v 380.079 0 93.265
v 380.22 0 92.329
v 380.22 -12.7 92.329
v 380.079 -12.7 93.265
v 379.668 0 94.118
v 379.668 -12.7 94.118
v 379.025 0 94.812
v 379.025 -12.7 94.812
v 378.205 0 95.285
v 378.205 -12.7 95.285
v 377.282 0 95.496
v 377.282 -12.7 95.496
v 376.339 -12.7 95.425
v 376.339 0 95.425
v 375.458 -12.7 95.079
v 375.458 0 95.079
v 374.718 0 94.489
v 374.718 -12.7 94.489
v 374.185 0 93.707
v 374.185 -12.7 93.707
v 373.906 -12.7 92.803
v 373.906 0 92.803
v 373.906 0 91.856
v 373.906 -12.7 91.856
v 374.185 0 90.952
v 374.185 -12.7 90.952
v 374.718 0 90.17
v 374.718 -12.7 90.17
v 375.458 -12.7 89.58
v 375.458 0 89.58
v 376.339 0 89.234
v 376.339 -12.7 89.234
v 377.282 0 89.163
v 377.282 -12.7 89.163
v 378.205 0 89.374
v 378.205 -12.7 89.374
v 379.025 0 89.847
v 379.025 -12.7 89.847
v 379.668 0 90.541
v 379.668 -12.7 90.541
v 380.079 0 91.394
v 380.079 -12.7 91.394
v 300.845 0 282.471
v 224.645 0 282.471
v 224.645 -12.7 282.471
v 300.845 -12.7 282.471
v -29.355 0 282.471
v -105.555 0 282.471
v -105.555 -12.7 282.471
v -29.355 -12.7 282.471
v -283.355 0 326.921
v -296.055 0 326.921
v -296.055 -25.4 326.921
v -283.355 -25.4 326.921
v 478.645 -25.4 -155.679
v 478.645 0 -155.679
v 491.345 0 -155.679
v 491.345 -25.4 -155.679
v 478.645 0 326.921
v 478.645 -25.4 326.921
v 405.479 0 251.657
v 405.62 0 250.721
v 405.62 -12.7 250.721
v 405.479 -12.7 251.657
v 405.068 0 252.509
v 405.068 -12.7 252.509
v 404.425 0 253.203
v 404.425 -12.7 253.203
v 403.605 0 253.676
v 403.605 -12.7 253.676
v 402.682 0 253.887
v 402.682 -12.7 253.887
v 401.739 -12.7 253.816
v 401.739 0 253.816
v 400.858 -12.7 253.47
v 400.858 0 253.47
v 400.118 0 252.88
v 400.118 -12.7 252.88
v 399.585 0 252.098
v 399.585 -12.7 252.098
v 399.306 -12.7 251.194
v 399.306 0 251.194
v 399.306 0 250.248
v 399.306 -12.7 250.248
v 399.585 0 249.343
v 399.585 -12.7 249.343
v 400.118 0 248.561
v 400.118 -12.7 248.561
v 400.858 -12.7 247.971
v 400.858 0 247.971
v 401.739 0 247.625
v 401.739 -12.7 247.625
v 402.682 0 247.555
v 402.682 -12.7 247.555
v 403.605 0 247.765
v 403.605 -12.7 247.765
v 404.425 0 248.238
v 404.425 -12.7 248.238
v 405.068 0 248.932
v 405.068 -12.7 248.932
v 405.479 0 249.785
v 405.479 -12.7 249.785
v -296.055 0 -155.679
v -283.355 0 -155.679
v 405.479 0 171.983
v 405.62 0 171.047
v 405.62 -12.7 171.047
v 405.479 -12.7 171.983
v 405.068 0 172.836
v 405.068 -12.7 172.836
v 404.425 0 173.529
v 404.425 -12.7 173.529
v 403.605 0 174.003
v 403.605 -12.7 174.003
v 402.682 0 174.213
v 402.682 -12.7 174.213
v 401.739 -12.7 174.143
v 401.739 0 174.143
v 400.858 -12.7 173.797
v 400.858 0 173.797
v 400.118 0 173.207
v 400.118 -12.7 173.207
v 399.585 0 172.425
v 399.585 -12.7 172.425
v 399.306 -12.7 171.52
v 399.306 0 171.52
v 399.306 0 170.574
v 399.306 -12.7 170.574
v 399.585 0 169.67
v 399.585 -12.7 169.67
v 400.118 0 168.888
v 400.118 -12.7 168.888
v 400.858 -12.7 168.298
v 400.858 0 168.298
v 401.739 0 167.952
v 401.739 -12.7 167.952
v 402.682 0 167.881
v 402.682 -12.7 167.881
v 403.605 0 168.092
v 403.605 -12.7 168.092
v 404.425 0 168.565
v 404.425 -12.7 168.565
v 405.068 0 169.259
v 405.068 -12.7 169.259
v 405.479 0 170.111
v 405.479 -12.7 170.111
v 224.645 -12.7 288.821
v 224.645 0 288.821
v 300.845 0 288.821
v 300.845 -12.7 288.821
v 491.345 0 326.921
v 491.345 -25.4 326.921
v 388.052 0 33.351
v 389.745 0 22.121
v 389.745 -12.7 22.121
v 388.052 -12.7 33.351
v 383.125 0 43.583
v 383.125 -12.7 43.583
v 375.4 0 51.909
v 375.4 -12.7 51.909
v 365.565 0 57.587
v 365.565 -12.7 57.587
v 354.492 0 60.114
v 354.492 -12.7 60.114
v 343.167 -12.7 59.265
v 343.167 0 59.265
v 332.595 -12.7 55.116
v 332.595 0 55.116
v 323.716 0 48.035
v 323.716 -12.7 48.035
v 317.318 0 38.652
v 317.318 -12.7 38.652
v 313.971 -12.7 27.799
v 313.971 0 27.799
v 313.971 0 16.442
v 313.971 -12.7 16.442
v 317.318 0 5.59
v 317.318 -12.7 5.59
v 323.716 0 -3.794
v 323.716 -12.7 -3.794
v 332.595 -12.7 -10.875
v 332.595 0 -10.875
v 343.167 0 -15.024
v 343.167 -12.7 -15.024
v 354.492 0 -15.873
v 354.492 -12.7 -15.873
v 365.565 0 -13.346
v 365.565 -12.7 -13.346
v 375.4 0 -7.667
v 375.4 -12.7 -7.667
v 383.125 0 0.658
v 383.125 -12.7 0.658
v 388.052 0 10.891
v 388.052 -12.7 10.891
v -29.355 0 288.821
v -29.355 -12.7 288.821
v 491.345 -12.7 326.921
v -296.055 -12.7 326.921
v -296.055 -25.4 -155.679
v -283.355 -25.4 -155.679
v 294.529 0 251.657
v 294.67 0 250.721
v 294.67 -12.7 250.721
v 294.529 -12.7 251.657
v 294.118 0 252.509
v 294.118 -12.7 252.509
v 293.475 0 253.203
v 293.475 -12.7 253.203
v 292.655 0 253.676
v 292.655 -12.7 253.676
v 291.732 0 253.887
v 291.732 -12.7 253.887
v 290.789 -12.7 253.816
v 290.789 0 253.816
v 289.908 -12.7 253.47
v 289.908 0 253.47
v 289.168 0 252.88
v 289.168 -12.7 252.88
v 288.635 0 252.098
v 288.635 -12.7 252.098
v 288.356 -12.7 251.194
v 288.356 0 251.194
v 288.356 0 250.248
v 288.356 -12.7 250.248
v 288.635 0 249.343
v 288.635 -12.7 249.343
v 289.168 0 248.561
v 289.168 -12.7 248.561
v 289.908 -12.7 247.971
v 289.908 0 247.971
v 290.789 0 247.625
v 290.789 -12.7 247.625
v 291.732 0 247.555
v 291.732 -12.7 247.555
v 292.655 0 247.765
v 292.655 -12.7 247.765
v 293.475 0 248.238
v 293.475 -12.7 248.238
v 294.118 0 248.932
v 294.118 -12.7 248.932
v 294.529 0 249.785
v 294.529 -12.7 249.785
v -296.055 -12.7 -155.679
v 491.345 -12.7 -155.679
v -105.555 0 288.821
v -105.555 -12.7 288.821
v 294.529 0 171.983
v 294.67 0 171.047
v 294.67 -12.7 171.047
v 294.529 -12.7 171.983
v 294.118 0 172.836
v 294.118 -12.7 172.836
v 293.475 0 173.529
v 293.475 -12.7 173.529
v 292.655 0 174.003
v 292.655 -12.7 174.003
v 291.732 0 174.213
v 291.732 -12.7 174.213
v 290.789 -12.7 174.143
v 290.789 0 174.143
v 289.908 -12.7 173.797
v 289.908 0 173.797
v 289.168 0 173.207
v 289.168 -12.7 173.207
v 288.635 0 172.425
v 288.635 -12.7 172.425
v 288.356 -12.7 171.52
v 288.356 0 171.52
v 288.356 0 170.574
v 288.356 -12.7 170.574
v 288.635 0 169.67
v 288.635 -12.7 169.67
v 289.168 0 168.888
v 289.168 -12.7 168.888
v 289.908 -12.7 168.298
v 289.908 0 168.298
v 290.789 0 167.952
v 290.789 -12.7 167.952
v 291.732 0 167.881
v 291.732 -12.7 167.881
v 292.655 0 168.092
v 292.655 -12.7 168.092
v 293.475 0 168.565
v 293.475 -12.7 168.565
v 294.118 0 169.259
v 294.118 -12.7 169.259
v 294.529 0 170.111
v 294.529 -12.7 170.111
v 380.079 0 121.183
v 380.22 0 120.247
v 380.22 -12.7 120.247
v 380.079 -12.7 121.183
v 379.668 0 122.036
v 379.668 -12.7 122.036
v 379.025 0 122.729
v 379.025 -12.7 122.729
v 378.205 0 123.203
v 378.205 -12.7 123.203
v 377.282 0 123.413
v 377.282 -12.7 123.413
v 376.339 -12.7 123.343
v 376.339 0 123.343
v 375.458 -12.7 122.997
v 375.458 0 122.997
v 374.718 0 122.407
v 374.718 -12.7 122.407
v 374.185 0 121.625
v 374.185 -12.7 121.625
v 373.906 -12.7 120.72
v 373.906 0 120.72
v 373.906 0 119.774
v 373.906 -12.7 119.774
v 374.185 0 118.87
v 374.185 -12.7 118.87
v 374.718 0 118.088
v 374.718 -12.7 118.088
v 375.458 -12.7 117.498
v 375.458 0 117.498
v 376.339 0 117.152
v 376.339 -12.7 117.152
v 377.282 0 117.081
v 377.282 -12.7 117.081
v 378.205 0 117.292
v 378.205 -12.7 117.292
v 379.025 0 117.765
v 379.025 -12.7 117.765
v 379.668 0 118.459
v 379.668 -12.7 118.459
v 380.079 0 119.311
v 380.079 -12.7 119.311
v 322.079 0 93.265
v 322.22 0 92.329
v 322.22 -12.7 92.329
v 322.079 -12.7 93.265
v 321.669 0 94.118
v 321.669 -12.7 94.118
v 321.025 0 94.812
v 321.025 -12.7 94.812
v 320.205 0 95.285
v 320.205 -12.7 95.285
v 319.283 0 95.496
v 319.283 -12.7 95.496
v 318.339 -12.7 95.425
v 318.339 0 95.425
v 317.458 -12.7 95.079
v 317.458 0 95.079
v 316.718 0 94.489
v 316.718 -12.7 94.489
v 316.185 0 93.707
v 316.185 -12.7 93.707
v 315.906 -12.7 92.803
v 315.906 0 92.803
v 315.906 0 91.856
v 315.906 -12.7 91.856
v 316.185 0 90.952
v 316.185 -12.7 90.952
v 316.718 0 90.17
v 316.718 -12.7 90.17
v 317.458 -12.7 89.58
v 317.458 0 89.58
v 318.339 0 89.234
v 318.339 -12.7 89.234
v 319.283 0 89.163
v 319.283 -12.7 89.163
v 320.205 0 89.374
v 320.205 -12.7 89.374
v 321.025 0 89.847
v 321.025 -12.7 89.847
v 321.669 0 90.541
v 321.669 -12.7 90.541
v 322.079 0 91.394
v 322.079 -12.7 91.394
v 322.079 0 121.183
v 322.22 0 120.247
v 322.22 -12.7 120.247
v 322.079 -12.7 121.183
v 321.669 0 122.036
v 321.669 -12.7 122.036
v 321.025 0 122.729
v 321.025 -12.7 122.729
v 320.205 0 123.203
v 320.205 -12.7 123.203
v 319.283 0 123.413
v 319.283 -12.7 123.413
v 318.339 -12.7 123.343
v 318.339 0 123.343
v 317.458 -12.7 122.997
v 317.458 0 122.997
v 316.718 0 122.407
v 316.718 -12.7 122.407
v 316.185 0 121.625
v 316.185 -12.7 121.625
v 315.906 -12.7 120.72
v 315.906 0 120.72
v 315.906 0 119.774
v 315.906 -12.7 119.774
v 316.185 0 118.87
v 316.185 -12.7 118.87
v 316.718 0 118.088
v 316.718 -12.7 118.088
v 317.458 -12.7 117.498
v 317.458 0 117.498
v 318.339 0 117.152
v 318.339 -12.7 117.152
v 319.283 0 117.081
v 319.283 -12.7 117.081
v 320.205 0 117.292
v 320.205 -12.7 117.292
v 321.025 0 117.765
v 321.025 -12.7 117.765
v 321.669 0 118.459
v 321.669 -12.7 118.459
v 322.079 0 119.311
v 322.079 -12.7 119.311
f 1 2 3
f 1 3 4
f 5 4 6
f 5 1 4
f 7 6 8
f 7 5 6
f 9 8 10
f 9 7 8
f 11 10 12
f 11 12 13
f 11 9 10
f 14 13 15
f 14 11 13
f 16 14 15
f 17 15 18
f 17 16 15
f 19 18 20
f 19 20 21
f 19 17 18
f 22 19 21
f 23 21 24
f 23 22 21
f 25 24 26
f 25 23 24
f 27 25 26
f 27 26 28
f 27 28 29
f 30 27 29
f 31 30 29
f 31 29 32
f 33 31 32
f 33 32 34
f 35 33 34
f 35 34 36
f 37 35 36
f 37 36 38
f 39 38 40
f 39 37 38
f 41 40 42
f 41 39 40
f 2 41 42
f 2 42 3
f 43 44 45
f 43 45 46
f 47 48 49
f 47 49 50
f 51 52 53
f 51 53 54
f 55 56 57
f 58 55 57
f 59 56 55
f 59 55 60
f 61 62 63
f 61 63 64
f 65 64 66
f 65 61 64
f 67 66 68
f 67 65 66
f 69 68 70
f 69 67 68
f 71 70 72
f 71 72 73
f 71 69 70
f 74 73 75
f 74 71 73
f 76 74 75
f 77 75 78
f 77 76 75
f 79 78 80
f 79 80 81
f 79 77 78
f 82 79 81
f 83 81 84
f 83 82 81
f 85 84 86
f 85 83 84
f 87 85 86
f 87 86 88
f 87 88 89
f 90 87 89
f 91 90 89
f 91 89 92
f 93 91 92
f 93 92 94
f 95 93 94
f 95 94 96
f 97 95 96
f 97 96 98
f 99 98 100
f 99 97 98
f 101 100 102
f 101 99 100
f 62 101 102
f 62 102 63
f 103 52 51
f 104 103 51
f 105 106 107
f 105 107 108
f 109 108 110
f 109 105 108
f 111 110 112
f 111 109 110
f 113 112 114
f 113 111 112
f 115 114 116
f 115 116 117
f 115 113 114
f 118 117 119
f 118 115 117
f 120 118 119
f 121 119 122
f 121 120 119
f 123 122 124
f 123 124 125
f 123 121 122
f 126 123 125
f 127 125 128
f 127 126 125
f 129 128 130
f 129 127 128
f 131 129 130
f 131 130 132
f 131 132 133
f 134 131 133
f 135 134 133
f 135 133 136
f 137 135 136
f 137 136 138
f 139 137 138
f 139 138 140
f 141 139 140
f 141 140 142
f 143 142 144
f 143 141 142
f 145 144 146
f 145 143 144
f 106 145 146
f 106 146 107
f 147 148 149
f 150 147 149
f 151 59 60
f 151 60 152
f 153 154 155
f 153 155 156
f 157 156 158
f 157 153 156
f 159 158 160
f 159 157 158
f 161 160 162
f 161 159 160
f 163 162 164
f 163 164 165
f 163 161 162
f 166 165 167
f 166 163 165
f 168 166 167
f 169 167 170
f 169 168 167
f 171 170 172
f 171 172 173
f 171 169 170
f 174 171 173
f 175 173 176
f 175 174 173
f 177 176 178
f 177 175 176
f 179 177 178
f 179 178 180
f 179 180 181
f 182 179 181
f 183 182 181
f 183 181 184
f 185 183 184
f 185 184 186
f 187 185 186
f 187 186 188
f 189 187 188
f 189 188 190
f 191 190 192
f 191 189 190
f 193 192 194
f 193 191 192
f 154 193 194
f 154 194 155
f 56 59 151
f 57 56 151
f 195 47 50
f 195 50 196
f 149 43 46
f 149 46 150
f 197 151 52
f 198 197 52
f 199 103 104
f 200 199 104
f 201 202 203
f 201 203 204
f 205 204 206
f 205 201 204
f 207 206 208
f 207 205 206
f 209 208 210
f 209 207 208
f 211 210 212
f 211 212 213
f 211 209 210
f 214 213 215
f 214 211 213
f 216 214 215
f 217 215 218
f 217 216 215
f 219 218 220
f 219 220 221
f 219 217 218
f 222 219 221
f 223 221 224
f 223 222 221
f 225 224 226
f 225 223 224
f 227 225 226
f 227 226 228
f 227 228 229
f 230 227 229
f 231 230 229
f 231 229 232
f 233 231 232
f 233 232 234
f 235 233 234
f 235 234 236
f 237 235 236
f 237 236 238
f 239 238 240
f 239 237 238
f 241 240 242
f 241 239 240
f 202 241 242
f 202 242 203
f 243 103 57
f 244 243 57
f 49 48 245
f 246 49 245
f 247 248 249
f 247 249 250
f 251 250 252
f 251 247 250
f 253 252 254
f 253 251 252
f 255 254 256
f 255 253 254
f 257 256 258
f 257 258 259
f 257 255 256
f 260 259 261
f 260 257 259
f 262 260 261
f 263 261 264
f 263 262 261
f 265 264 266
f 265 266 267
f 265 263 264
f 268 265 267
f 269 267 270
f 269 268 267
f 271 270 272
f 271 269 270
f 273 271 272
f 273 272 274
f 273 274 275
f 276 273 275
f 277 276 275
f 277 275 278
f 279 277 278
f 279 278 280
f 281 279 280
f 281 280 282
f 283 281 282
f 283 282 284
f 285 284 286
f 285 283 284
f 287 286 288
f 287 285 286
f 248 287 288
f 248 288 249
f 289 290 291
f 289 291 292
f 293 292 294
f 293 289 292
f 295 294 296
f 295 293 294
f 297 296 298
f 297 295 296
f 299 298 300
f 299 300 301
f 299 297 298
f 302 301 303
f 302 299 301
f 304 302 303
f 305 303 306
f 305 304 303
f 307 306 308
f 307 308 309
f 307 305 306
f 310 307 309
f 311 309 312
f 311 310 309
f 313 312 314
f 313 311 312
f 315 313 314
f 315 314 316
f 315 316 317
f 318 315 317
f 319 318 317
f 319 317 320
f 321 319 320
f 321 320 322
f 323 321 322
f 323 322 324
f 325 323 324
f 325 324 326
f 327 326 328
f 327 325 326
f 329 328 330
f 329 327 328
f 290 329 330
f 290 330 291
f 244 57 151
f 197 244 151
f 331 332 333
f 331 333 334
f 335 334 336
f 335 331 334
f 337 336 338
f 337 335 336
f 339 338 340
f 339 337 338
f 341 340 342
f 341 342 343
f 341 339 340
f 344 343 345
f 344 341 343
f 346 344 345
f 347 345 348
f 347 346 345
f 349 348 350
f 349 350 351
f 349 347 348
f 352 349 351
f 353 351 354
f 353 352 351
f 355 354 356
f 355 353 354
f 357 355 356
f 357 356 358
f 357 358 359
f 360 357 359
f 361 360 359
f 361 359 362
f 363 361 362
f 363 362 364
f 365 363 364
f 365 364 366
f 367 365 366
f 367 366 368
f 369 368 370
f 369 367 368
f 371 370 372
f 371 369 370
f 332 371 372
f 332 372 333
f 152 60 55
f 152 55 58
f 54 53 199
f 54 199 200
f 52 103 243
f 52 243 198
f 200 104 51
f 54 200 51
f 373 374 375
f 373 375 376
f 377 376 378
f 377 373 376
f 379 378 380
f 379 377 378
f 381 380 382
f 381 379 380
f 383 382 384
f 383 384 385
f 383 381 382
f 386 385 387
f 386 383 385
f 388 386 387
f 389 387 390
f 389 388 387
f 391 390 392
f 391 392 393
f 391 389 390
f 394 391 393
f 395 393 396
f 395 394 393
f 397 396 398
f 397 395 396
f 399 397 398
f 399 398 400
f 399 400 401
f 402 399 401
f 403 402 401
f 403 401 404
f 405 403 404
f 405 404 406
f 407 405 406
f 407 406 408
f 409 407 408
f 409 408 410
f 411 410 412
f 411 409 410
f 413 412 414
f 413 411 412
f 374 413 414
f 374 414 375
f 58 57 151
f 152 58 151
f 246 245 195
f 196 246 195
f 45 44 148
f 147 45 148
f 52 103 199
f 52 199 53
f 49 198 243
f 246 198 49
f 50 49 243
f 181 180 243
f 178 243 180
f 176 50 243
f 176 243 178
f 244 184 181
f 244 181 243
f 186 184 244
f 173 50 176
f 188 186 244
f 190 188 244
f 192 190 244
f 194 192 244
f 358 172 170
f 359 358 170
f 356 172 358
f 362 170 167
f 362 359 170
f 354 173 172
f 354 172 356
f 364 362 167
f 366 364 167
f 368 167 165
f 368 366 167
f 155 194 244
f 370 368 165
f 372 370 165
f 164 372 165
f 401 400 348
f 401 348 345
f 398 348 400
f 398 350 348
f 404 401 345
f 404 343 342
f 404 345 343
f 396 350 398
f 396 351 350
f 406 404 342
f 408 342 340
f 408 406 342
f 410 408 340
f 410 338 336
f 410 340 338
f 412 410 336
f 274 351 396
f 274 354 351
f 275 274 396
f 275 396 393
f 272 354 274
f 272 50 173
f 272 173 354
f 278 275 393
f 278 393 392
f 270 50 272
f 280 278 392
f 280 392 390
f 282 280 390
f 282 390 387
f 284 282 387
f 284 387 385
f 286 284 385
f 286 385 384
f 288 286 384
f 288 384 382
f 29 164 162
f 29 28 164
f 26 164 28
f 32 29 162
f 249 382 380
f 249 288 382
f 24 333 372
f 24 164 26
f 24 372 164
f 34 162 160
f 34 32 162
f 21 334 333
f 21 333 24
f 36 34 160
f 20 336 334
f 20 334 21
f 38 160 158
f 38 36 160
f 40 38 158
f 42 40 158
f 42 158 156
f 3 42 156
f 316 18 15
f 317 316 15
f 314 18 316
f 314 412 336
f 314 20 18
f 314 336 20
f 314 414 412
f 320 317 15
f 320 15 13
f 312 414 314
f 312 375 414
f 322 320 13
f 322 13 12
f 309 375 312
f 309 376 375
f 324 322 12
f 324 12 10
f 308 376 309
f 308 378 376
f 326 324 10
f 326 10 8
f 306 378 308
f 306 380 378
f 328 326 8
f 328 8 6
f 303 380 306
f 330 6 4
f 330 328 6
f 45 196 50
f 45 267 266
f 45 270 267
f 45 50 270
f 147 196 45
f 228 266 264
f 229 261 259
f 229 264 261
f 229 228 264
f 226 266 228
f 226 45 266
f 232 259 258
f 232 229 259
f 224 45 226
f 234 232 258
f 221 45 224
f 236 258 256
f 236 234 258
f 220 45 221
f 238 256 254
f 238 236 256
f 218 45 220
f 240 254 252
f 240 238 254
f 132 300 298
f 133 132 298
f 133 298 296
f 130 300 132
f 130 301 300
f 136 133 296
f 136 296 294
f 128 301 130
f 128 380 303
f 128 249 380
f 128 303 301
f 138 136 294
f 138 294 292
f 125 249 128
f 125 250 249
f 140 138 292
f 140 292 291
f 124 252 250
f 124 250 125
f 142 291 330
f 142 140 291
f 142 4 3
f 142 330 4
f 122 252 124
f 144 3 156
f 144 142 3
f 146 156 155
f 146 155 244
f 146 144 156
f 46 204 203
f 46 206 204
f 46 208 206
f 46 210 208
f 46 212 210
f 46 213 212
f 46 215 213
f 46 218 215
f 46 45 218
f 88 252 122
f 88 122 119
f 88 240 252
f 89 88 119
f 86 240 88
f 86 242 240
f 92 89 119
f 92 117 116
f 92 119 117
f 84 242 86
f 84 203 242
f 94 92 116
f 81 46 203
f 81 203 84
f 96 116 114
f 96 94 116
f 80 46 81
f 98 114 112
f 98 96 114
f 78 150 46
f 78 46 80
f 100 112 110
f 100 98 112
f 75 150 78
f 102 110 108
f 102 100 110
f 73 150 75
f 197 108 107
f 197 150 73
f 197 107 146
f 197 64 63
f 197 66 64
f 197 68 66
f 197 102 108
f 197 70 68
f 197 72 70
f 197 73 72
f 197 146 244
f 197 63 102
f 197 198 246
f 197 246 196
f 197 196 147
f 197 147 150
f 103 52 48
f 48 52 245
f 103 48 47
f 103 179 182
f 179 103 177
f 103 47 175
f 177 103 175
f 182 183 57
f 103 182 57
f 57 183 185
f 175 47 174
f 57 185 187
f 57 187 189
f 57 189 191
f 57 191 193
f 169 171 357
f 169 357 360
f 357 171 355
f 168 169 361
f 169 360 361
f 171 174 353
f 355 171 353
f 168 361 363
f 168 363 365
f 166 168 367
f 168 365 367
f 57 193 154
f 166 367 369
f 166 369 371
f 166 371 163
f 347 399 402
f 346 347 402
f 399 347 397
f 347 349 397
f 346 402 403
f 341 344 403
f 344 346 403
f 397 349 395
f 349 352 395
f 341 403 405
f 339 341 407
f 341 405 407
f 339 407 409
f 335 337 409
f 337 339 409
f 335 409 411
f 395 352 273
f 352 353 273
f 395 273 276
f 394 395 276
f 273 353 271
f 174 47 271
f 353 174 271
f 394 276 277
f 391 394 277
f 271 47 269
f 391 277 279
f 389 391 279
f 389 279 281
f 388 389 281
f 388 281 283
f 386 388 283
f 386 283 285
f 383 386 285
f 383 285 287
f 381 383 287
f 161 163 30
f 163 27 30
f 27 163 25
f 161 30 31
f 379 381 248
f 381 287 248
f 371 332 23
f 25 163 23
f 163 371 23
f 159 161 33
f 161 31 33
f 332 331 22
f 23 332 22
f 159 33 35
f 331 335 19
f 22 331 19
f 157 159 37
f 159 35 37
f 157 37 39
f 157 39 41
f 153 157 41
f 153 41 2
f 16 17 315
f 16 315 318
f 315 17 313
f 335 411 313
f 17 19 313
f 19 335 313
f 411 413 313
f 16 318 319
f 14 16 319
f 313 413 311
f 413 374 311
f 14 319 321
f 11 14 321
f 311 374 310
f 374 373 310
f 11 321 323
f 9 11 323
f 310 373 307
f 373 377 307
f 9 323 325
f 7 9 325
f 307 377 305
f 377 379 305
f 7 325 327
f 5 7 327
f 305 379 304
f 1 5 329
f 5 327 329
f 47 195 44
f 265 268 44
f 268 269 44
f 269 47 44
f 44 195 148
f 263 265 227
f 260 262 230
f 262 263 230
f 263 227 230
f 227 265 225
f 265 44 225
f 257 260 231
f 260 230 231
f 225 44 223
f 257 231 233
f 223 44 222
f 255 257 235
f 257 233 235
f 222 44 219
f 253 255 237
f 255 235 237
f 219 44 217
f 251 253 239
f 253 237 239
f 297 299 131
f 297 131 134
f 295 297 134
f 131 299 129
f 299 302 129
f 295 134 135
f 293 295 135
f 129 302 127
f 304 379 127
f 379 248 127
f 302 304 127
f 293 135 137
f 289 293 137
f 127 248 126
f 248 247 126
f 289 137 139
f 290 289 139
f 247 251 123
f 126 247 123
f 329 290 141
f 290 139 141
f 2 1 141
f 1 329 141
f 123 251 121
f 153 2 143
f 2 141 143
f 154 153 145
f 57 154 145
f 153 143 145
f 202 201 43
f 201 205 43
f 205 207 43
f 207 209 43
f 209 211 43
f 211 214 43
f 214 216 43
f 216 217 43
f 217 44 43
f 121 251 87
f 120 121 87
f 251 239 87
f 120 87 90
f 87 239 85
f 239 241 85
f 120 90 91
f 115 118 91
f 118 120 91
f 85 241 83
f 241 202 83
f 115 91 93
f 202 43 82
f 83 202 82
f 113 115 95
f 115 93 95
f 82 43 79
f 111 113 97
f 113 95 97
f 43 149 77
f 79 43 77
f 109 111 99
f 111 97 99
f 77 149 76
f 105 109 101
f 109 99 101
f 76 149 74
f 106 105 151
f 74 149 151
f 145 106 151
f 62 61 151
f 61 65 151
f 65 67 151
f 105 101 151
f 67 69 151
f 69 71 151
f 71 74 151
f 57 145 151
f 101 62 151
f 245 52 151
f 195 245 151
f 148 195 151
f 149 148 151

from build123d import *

# Parameters (mm, degrees)
F0_W     = 12.7
F0_H     = 482.6
F1_DEPTH = 25.4
F0_W_2   = 762
F0_R     = 38.1
F0_W_3   = 76.2
F0_H_2   = 6.35
F0_R_2   = 3.175
F2_DEPTH = 12.7


with BuildPart() as f1:
    # F0 (on Front) → F1 (new body)
    with BuildSketch(Plane.XZ):
        with Locations((-289.704832, 85.620722)):
            Rectangle(F0_W, F0_H)
        with Locations((484.995168, 85.620722)):
            Rectangle(F0_W, F0_H)
    extrude(amount=F1_DEPTH)


with BuildPart() as f2:
    # F0 (on Front) → F2 (new body)
    with BuildSketch(Plane.XZ):
        with Locations((-289.704832, 85.620722)):
            Rectangle(F0_W, F0_H)
        with Locations((97.645168, 85.620722)):
            Rectangle(F0_W_2, F0_H)
        with Locations((351.645168, 22.120722)):
            Circle(F0_R, mode=Mode.SUBTRACT)
        with Locations((-67.454832, 285.645722)):
            Rectangle(F0_W_3, F0_H_2, mode=Mode.SUBTRACT)
        with Locations((291.495174, 171.04717)):
            Circle(F0_R_2, mode=Mode.SUBTRACT)
        with Locations((319.045284, 92.329421)):
            Circle(F0_R_2, mode=Mode.SUBTRACT)
        with Locations((377.045168, 92.329421)):
            Circle(F0_R_2, mode=Mode.SUBTRACT)
        with Locations((319.045284, 120.24717)):
            Circle(F0_R_2, mode=Mode.SUBTRACT)
        with Locations((377.045168, 120.24717)):
            Circle(F0_R_2, mode=Mode.SUBTRACT)
        with Locations((402.445168, 171.04717)):
            Circle(F0_R_2, mode=Mode.SUBTRACT)
        with Locations((291.495174, 250.720722)):
            Circle(F0_R_2, mode=Mode.SUBTRACT)
        with Locations((262.745168, 285.645722)):
            Rectangle(F0_W_3, F0_H_2, mode=Mode.SUBTRACT)
        with Locations((402.445168, 250.720722)):
            Circle(F0_R_2, mode=Mode.SUBTRACT)
        with Locations((484.995168, 85.620722)):
            Rectangle(F0_W, F0_H)
    extrude(amount=F2_DEPTH)


solid = Compound([f1.part, f2.part])
